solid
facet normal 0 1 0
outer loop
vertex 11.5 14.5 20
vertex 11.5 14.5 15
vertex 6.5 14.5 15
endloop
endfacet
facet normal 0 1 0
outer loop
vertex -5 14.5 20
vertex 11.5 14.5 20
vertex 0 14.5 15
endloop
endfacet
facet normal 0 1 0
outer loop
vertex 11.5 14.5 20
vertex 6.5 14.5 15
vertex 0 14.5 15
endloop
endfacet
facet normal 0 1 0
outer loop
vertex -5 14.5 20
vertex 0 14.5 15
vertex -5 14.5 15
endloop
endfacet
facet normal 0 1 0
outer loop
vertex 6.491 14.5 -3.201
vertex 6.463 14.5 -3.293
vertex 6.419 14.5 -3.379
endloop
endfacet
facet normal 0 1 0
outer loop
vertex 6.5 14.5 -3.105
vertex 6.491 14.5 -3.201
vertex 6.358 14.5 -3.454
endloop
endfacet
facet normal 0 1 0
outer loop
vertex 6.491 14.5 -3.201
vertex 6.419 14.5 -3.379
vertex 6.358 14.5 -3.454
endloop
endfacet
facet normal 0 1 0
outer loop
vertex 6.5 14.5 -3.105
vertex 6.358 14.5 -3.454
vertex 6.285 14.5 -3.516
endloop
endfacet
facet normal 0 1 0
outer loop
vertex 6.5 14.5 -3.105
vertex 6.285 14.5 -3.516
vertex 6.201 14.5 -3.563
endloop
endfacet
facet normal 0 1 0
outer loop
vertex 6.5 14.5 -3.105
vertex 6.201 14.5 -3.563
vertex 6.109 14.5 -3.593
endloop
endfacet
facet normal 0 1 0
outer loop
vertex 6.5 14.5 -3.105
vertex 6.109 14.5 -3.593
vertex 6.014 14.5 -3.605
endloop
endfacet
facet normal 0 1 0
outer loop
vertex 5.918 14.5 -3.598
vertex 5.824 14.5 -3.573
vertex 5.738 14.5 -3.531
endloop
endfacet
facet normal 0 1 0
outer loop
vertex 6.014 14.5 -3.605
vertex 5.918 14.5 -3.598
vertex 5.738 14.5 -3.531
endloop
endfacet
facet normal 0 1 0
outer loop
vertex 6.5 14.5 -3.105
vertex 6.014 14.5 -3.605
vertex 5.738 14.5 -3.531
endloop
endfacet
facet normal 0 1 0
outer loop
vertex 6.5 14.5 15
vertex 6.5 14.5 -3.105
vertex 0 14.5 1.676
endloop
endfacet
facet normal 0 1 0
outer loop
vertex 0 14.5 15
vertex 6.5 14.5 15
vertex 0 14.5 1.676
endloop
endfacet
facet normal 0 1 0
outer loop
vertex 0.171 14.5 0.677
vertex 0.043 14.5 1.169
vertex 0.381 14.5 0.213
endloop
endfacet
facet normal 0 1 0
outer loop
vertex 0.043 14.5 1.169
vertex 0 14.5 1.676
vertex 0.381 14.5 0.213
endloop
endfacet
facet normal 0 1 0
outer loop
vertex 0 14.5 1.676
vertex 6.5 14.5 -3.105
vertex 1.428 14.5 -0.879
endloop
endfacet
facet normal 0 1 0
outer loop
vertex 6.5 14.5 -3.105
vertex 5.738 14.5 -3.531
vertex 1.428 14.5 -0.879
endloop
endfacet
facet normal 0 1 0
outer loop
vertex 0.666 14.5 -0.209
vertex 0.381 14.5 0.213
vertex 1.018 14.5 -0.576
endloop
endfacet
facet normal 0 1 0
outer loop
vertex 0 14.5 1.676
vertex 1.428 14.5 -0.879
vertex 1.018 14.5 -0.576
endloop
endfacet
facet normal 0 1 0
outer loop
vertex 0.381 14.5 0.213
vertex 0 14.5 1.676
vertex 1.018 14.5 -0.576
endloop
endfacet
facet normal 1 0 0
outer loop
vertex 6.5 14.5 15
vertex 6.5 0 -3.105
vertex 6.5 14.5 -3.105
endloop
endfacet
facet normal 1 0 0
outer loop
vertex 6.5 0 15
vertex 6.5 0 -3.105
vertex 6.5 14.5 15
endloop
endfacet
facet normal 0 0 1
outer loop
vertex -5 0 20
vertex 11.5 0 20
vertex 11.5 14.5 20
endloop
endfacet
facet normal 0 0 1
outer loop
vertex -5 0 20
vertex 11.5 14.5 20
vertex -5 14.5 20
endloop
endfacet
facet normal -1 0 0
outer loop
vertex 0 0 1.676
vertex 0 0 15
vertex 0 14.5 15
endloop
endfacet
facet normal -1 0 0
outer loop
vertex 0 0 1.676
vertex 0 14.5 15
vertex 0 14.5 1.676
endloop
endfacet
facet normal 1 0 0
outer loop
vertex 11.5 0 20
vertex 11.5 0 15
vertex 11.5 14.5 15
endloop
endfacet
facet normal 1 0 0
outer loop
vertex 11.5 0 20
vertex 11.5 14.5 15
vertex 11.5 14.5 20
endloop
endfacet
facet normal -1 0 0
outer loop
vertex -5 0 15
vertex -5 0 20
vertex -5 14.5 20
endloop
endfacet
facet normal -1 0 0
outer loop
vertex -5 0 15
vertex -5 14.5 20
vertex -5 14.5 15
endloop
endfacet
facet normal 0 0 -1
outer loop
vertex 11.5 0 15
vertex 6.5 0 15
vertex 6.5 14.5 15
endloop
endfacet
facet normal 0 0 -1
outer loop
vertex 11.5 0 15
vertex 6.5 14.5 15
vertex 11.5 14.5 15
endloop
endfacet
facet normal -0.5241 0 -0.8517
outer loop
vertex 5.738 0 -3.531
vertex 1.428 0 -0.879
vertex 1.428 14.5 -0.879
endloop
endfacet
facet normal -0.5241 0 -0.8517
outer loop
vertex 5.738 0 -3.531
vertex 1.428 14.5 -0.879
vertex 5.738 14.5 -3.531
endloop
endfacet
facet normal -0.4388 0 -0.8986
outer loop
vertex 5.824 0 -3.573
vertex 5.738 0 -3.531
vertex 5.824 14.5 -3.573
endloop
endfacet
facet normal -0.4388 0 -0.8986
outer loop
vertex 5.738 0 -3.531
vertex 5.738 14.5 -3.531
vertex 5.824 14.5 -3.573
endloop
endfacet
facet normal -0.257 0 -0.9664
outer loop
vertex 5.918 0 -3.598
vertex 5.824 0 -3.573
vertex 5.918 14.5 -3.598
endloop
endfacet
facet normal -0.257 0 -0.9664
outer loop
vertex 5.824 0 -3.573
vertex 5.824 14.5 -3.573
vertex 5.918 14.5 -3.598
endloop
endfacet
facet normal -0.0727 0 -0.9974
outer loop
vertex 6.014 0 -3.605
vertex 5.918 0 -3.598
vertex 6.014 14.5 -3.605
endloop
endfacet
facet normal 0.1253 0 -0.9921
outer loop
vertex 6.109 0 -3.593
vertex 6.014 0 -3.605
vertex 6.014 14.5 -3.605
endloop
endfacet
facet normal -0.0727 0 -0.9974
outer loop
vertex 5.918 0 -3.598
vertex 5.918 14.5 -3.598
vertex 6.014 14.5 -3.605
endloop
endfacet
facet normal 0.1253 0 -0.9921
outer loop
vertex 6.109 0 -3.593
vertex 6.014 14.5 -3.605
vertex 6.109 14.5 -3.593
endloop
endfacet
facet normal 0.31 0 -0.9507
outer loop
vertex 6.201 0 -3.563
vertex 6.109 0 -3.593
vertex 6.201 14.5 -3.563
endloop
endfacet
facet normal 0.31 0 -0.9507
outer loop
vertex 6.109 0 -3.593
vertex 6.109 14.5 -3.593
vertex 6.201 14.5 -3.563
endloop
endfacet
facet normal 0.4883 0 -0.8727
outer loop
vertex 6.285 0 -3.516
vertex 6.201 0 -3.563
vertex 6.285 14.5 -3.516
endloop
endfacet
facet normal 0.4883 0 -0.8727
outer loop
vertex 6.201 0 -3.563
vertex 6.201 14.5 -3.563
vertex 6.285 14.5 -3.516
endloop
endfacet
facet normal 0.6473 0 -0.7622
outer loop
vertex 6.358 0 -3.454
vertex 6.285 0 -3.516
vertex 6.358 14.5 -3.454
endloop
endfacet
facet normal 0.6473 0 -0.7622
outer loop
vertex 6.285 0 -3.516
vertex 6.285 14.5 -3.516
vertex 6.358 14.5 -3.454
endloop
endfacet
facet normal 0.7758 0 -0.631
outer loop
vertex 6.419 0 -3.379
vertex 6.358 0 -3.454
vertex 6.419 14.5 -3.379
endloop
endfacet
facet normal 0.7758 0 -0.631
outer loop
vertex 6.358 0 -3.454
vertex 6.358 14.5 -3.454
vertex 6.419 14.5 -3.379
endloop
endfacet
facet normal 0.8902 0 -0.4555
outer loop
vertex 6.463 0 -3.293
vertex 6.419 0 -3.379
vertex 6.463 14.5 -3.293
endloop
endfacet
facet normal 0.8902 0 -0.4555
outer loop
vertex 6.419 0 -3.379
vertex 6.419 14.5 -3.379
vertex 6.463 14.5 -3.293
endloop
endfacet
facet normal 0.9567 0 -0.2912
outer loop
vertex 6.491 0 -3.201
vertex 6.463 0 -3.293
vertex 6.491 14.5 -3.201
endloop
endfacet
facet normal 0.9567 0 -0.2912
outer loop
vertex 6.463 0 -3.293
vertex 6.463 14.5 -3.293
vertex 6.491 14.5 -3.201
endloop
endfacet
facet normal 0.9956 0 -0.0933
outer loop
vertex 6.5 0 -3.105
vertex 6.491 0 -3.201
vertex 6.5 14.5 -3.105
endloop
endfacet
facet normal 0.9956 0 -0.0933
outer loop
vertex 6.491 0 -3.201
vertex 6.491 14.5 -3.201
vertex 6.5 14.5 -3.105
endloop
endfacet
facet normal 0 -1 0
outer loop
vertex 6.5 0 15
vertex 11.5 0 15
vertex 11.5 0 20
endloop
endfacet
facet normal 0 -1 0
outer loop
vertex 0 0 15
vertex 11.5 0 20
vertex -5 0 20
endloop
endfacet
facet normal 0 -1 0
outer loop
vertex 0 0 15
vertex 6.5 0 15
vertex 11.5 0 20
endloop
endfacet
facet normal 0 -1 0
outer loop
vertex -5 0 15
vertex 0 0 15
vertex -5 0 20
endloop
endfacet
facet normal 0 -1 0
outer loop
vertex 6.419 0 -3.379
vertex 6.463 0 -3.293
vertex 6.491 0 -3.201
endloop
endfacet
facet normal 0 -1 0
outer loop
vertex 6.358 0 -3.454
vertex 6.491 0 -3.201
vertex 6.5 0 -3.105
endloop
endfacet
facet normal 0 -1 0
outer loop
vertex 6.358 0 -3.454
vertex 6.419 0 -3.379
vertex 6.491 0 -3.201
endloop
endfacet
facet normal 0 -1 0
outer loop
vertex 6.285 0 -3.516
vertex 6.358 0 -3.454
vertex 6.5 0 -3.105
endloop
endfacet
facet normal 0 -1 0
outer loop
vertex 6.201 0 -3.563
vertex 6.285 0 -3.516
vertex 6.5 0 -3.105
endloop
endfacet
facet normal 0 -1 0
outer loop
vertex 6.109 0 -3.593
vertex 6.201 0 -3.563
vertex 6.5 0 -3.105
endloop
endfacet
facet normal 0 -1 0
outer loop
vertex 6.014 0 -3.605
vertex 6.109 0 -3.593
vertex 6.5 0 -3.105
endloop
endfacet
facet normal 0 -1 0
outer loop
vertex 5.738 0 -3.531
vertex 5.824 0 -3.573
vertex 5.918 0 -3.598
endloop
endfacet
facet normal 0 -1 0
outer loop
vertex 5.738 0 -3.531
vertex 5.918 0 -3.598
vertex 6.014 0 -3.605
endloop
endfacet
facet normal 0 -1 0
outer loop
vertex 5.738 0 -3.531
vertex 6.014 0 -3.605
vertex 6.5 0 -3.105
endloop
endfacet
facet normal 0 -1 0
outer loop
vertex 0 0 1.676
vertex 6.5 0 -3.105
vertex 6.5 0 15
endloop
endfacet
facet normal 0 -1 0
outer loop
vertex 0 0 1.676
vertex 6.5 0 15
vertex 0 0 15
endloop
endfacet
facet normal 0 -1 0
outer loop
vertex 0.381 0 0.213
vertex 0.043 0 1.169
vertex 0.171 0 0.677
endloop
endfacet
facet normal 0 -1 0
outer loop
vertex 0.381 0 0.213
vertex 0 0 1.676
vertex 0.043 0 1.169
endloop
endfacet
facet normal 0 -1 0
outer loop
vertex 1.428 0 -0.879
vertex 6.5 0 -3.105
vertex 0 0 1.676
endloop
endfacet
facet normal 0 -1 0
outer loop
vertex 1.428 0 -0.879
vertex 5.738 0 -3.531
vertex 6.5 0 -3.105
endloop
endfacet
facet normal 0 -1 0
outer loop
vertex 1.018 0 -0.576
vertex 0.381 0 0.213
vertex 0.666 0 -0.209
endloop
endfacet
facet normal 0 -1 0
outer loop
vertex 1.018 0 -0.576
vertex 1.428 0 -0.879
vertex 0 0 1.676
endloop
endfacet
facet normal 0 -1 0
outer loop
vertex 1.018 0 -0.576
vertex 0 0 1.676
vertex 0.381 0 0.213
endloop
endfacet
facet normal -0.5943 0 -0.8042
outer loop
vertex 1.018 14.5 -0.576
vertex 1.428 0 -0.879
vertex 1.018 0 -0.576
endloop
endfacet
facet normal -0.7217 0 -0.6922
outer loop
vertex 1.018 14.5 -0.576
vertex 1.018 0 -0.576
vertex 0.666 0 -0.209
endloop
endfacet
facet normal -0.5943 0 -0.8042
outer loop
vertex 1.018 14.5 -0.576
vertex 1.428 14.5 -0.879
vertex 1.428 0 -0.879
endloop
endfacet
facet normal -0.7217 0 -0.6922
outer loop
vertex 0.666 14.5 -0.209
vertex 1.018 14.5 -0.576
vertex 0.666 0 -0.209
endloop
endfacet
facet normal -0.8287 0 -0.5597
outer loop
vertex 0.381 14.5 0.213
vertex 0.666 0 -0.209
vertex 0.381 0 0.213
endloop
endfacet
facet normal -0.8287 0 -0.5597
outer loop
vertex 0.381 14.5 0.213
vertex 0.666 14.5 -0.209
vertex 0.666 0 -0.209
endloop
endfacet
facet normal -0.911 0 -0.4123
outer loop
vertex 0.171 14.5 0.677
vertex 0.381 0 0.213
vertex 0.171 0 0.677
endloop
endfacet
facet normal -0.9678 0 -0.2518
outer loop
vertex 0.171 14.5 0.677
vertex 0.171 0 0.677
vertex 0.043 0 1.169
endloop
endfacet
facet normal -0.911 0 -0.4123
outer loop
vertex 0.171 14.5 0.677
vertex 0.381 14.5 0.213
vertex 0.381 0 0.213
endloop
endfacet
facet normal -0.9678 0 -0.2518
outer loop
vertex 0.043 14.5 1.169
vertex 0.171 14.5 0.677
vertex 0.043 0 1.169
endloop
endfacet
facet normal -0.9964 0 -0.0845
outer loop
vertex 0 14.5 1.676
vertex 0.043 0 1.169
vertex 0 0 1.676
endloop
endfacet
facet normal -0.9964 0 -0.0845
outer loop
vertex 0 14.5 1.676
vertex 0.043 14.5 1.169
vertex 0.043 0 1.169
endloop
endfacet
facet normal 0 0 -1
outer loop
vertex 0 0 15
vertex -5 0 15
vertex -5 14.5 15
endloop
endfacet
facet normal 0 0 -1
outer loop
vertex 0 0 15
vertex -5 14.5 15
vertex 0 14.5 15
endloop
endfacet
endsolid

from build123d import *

# Parameters (mm, degrees)
EXTRUDE_1_DEPTH = 14.5
FILLET_1_R      = 3
FILLET_2_R      = 0.5


with BuildPart() as part:
    # 草图1 → 凸台-拉伸1 (new body)
    with BuildSketch(Plane(origin=(0, 0, 0), x_dir=(1, 0, 0), z_dir=(0, 1, 0))):
        Polygon((0, 0), (6.5, 4), (6.5, -15), (11.5, -15), (11.5, -20), (-5, -20), (-5, -15), (0, -15), align=None)
    extrude(amount=EXTRUDE_1_DEPTH)

    # 圆角1
    fillet_1_edges = [part.edges().sort_by_distance(p)[0] for p in [
        (0, 7.25, 0),
    ]]
    fillet(fillet_1_edges, radius=FILLET_1_R)

    # 圆角2
    fillet_2_edges = [part.edges().sort_by_distance(p)[0] for p in [
        (6.5, 7.25, -4),
    ]]
    fillet(fillet_2_edges, radius=FILLET_2_R)


solid = part.part
